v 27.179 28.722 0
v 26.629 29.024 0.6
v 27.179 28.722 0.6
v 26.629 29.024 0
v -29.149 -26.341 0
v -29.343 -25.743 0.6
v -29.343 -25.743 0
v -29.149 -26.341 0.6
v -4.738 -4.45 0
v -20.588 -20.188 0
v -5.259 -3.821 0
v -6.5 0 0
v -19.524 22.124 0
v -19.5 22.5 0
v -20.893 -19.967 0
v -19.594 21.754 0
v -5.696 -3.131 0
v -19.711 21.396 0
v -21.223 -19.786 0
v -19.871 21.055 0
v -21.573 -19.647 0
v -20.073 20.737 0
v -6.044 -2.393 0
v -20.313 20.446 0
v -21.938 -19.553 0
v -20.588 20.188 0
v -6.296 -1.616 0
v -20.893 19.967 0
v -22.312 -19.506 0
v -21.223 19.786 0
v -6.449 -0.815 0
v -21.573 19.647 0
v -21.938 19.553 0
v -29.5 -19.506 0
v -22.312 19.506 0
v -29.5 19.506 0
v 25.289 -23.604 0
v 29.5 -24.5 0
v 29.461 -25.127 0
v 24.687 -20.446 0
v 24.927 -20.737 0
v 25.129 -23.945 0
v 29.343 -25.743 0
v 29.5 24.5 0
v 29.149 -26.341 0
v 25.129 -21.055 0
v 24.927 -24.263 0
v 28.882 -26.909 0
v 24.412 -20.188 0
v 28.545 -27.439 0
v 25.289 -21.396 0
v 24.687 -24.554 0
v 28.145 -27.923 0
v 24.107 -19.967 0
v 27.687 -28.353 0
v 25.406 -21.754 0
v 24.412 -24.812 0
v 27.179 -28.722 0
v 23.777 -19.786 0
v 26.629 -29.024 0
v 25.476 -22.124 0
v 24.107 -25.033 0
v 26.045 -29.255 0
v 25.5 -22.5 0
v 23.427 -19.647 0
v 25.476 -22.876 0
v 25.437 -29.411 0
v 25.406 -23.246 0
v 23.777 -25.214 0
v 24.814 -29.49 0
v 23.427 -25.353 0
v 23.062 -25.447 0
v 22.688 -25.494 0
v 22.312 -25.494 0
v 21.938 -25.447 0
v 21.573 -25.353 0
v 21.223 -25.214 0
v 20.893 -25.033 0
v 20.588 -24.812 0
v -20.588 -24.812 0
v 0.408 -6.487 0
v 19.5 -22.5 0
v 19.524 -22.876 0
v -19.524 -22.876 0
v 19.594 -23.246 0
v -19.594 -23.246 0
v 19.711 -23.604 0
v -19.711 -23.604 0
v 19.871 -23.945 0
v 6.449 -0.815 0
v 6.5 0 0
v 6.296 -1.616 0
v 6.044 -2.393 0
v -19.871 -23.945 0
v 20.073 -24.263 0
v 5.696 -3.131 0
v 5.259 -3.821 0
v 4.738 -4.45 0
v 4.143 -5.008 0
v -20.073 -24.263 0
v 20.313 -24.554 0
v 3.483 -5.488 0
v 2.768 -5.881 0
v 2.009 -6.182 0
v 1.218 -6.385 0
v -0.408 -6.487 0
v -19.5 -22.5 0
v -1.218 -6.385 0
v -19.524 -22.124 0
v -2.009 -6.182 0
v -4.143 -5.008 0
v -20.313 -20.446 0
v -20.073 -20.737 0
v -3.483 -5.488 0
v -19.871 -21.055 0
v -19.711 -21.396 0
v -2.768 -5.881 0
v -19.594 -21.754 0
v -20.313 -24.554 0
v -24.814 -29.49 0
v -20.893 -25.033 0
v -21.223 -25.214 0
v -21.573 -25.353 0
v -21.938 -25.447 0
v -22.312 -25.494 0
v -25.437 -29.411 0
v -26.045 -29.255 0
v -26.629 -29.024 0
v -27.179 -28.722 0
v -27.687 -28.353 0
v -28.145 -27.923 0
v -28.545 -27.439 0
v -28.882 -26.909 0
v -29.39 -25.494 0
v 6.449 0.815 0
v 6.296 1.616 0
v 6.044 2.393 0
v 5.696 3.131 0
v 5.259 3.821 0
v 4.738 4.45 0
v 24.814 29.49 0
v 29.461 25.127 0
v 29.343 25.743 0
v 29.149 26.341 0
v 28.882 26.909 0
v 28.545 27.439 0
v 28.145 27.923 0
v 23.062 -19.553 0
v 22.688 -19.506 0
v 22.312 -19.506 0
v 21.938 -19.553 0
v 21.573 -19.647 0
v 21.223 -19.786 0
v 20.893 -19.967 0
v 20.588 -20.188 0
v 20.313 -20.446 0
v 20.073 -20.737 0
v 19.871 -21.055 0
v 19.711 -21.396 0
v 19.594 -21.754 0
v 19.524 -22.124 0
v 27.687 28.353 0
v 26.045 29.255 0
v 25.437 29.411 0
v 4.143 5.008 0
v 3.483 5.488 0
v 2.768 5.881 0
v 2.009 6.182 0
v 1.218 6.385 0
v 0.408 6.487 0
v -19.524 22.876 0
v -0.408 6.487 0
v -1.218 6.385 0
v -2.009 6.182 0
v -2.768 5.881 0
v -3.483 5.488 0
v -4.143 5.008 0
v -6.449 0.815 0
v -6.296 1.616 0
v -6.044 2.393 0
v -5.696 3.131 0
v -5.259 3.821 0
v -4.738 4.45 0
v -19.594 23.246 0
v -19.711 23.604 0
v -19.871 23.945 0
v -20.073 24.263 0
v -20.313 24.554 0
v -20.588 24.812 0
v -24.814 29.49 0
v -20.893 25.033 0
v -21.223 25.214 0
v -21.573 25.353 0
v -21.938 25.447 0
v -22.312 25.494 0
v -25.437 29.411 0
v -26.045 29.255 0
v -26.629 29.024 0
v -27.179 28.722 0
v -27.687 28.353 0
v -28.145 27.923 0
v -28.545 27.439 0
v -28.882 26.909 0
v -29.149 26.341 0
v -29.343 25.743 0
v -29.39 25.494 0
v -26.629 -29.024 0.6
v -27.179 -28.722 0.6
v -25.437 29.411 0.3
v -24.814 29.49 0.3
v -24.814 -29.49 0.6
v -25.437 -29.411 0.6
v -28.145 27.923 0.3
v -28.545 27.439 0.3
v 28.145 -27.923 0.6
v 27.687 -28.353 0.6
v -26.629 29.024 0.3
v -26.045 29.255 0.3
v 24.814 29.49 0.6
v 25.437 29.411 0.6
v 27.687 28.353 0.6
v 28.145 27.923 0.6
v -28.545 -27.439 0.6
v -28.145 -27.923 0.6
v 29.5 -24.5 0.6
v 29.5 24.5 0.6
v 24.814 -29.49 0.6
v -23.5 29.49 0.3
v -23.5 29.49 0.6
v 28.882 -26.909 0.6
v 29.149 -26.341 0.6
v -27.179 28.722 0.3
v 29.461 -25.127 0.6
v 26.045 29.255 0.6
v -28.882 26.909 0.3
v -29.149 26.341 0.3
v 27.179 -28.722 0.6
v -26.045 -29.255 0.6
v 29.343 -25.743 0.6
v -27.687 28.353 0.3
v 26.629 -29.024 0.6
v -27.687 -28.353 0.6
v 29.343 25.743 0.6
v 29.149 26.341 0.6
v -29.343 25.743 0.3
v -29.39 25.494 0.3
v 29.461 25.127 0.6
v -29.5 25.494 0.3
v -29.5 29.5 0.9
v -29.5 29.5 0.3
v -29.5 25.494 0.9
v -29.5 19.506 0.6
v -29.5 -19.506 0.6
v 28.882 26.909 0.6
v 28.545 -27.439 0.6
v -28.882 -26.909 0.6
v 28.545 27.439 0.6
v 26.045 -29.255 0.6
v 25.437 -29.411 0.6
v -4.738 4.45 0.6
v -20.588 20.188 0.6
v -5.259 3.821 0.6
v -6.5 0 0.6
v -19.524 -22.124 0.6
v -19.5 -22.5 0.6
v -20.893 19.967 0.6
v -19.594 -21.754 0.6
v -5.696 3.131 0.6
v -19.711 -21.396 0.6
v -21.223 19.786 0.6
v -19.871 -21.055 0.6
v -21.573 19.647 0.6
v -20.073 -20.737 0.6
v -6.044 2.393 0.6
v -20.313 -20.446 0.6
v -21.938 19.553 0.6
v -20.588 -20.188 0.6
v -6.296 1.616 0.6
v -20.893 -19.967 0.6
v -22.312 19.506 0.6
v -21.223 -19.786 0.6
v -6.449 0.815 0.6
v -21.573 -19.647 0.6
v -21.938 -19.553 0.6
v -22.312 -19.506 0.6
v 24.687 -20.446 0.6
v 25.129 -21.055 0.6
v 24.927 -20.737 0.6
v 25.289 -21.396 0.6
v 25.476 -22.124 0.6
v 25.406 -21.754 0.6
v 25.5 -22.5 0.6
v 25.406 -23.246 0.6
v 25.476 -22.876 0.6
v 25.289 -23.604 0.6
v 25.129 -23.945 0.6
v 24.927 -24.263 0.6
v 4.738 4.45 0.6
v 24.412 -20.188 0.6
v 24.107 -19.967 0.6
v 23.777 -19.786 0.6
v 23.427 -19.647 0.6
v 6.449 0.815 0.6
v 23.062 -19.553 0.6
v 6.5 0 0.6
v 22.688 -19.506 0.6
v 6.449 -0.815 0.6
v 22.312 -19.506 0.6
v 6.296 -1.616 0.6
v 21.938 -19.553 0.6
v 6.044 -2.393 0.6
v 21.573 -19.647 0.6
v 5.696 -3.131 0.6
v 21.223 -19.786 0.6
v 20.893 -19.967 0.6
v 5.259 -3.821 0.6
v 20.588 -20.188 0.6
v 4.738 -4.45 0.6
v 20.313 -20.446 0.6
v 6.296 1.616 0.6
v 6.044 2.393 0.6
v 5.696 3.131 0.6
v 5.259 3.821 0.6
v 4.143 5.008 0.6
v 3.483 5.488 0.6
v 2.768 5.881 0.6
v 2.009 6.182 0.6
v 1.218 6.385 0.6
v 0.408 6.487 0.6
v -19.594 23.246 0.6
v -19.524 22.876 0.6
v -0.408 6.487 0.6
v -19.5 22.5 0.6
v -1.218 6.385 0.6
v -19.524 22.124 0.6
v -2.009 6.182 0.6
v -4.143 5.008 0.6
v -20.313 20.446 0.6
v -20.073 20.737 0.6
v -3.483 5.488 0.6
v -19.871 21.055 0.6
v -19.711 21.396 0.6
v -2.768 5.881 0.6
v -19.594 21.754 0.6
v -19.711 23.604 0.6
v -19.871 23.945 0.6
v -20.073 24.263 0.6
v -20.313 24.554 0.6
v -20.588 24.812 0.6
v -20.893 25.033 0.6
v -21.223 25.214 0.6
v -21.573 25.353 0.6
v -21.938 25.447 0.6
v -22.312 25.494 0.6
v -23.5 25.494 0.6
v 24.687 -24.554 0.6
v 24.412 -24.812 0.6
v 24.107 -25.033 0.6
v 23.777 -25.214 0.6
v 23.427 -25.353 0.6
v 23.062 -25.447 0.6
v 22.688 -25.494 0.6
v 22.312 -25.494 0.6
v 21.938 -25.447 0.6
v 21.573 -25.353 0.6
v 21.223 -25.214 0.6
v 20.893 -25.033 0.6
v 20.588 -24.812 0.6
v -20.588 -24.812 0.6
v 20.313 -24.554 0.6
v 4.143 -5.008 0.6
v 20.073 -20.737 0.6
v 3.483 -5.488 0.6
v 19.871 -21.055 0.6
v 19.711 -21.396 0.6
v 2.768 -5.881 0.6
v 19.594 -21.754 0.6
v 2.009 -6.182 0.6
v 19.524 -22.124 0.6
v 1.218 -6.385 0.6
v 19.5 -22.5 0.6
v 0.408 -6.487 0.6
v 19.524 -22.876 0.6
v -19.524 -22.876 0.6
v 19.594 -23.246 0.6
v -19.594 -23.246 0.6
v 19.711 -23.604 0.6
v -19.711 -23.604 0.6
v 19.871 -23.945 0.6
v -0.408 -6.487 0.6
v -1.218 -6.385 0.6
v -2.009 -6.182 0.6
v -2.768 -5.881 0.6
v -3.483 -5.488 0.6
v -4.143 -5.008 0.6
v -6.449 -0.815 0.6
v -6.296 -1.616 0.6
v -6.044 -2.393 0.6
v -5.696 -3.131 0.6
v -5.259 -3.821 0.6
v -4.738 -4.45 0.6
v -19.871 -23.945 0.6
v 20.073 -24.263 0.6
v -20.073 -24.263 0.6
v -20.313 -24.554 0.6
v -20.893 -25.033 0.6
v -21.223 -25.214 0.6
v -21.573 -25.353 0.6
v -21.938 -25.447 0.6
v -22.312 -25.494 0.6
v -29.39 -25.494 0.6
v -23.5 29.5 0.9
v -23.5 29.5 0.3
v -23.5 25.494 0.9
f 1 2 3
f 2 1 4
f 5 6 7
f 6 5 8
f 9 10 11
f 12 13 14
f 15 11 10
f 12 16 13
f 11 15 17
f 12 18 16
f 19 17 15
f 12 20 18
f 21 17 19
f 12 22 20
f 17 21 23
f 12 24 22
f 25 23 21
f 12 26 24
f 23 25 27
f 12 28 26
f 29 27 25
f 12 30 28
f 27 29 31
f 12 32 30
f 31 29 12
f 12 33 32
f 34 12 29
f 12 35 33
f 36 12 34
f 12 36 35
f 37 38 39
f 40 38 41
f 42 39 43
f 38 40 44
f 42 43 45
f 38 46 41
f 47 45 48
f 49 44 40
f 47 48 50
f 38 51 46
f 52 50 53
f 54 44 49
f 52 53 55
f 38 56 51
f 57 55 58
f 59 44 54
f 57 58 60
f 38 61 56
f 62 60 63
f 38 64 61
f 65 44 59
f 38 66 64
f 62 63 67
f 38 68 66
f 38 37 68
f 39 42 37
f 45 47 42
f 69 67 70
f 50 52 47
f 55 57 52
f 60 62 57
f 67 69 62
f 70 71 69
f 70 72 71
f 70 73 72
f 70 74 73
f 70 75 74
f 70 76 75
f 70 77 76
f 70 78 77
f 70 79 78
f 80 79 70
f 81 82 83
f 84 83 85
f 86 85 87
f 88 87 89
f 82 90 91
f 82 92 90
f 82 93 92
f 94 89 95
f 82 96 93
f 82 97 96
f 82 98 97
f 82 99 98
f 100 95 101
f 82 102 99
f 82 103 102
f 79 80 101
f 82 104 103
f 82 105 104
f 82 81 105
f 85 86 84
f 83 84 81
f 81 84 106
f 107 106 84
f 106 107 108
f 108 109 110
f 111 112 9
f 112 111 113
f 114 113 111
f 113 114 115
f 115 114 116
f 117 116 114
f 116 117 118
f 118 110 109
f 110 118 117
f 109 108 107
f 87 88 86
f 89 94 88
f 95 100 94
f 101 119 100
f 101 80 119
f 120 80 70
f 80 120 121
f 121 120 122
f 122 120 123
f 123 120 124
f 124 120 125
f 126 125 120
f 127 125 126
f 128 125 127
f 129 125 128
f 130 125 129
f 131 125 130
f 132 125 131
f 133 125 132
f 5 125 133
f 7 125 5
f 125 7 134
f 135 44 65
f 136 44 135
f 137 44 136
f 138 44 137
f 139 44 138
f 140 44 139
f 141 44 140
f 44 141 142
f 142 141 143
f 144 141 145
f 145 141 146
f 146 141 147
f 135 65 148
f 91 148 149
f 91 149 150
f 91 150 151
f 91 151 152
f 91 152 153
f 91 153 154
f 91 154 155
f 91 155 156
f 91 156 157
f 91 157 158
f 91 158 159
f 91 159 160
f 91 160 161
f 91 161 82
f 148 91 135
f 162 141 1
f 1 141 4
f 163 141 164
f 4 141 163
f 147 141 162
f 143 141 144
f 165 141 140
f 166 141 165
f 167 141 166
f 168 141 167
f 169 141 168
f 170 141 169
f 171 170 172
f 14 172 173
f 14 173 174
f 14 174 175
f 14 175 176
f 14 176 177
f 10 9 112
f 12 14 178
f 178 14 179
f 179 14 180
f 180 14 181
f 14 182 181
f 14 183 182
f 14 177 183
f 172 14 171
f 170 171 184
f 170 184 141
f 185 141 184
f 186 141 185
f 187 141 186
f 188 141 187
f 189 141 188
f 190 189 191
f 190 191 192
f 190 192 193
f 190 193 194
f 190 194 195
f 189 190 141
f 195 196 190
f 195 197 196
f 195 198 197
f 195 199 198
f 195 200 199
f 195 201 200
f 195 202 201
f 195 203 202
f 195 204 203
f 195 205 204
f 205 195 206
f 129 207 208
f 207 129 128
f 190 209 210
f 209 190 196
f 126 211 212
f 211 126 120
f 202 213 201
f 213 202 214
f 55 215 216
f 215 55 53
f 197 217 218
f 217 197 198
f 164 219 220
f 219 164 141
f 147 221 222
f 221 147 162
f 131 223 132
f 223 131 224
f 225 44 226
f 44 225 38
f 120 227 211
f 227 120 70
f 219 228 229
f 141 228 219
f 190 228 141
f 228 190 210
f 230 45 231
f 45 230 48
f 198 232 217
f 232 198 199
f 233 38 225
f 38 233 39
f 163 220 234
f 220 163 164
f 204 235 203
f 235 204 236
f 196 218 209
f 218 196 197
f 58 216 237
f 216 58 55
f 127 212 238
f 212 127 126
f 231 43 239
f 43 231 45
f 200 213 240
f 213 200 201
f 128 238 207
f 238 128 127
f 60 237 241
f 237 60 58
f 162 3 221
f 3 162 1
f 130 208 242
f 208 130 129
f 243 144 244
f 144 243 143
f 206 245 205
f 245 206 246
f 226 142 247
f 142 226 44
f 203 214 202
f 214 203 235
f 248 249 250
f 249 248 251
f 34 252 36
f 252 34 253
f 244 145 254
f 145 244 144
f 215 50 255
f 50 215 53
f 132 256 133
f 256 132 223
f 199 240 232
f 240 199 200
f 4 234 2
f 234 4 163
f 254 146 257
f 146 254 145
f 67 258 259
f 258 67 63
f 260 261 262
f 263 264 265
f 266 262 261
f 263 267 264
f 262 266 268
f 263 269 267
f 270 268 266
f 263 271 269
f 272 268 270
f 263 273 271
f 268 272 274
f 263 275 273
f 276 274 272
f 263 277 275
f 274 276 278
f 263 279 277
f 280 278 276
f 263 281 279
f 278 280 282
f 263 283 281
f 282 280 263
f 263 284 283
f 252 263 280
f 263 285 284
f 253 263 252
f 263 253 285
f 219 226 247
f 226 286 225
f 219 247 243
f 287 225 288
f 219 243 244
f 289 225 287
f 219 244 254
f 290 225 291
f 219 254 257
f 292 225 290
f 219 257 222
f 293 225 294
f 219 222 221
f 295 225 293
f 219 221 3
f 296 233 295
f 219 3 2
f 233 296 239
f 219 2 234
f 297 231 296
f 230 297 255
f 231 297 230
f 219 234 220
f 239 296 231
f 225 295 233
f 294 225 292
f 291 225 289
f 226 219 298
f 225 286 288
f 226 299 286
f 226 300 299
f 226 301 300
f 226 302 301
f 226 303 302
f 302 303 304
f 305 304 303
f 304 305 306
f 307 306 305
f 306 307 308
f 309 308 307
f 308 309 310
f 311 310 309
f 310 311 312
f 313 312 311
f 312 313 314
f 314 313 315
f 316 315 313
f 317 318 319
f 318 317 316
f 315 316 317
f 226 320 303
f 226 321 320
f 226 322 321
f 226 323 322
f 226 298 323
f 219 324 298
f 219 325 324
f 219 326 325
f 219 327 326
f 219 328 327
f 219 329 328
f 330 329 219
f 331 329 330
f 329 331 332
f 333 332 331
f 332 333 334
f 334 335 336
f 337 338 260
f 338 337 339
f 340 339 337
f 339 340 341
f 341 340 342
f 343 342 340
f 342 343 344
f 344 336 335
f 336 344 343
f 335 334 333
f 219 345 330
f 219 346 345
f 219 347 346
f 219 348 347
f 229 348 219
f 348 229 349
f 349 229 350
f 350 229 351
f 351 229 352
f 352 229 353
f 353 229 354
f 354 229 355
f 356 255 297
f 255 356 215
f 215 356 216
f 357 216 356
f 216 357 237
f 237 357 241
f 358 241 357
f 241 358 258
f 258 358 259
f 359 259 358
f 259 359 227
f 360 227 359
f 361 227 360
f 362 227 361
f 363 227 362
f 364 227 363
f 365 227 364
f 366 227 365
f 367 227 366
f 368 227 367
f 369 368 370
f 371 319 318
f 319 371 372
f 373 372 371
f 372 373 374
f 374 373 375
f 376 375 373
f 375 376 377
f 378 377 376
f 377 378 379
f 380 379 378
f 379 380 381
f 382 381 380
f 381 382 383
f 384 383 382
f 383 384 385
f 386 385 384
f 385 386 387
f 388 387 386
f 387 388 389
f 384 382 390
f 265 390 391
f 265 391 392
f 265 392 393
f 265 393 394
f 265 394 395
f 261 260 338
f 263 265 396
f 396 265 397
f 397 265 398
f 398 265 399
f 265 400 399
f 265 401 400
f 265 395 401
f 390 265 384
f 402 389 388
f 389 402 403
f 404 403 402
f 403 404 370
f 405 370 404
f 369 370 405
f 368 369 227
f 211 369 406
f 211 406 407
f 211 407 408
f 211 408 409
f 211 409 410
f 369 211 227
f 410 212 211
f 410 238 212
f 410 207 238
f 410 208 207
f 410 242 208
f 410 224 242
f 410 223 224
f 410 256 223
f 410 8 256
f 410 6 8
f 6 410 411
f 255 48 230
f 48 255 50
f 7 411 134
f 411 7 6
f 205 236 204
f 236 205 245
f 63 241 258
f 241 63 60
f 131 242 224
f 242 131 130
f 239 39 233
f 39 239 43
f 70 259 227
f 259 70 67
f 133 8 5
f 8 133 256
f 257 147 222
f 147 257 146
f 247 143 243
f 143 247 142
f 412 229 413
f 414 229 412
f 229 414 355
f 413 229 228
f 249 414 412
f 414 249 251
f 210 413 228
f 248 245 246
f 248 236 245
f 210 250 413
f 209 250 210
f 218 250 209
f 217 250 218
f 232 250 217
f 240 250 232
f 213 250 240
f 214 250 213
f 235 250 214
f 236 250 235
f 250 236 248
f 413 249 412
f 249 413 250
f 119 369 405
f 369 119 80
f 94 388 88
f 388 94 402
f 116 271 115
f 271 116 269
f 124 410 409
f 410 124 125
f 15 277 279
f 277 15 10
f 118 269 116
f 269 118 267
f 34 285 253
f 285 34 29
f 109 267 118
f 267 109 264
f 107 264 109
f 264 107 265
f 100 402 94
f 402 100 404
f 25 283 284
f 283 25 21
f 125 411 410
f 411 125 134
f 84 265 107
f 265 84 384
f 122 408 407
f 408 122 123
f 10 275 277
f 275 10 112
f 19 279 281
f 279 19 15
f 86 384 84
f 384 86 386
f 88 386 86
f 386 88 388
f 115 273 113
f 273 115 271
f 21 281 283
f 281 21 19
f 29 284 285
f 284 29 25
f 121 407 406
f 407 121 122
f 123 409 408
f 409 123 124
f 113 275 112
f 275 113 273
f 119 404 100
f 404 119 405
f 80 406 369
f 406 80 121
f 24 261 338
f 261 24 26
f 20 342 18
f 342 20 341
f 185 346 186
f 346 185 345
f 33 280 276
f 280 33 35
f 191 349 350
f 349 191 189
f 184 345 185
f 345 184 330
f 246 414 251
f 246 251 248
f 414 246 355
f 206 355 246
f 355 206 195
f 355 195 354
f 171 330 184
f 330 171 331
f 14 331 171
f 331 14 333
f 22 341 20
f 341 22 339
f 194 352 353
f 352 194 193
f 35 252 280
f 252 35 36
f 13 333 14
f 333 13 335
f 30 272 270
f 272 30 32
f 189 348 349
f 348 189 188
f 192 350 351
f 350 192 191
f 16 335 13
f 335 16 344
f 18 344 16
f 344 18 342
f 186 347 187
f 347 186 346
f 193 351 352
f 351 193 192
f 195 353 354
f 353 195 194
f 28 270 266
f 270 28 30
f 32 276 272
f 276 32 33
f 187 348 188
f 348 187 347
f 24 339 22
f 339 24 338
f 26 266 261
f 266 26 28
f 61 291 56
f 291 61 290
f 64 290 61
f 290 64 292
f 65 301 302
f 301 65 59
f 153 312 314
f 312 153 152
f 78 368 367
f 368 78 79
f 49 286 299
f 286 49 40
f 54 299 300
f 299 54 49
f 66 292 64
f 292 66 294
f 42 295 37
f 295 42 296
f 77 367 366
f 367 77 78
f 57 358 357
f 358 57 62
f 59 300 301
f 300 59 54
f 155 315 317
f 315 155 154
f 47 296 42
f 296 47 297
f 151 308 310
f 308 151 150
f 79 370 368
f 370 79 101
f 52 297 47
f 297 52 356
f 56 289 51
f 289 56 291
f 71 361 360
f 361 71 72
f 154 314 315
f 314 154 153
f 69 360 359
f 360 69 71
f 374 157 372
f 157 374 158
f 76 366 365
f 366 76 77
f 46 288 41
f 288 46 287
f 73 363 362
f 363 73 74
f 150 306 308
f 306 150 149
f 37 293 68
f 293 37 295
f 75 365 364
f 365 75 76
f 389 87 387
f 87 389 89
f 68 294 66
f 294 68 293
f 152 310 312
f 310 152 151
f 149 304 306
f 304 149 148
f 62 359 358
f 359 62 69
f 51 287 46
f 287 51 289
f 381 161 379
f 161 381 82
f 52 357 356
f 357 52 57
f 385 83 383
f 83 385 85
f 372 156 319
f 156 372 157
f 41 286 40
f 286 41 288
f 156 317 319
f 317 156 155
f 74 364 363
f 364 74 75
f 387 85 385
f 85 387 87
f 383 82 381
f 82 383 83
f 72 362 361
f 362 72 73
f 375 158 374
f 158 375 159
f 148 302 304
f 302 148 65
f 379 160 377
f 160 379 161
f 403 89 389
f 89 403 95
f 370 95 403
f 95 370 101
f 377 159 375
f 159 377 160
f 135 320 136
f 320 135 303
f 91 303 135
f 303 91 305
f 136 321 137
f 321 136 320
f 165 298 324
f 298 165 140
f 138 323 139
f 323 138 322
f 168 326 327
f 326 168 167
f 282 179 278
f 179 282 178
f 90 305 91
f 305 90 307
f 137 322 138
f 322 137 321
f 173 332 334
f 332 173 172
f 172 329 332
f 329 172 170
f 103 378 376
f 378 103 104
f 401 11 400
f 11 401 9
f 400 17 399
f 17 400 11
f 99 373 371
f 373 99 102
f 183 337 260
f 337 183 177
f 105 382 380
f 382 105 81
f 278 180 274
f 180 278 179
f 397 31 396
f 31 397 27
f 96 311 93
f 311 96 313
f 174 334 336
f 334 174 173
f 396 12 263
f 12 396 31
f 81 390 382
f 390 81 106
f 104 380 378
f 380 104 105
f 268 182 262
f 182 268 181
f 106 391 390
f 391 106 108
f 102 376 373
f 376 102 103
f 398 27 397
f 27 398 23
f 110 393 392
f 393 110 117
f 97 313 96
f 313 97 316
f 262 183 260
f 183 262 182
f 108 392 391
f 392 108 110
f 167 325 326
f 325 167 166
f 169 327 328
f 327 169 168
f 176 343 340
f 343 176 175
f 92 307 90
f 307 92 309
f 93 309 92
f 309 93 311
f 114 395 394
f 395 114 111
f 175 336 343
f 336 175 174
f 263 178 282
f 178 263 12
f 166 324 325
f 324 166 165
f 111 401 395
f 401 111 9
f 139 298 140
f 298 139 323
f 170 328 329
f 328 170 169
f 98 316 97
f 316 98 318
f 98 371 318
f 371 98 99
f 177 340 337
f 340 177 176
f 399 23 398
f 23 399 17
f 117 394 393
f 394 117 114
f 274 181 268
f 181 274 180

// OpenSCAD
$fn = 50;


difference() {
	union() {
		translate(v = [0, 0, 0]) {
			rotate(a = [0, 0, 0]) {
				hull() {
					translate(v = [-24.5000000000, 24.5000000000, 0]) {
						rotate(a = [0, 0, 0]) {
							translate(v = [0, 0, 0]) {
								rotate(a = [0, 0, 0]) {
									cylinder(h = 0.6000000000, r = 5);
								}
							}
						}
					}
					translate(v = [24.5000000000, 24.5000000000, 0]) {
						rotate(a = [0, 0, 0]) {
							translate(v = [0, 0, 0]) {
								rotate(a = [0, 0, 0]) {
									cylinder(h = 0.6000000000, r = 5);
								}
							}
						}
					}
					translate(v = [-24.5000000000, -24.5000000000, 0]) {
						rotate(a = [0, 0, 0]) {
							translate(v = [0, 0, 0]) {
								rotate(a = [0, 0, 0]) {
									cylinder(h = 0.6000000000, r = 5);
								}
							}
						}
					}
					translate(v = [24.5000000000, -24.5000000000, 0]) {
						rotate(a = [0, 0, 0]) {
							translate(v = [0, 0, 0]) {
								rotate(a = [0, 0, 0]) {
									cylinder(h = 0.6000000000, r = 5);
								}
							}
						}
					}
				}
			}
		}
		#translate(v = [-29.5000000000, 23.5000000000, 0.3000000000]) {
			rotate(a = [0, 0, 0]) {
				cube(size = [6, 6, 0.6000000000]);
			}
		}
	}
	union() {
		translate(v = [-30.0000000000, -22.5000000000, -125]) {
			rotate(a = [0, 0, 0]) {
				hull() {
					translate(v = [7.5000000000, 0, 0]) {
						rotate(a = [0, 0, 0]) {
							translate(v = [0, 0, 0]) {
								rotate(a = [0, 0, 0]) {
									cylinder(h = 250, r = 3.0000000000);
								}
							}
						}
					}
					translate(v = [-7.5000000000, 0, 0]) {
						rotate(a = [0, 0, 0]) {
							translate(v = [0, 0, 0]) {
								rotate(a = [0, 0, 0]) {
									cylinder(h = 250, r = 3.0000000000);
								}
							}
						}
					}
				}
			}
		}
		translate(v = [-30.0000000000, 22.5000000000, -125]) {
			rotate(a = [0, 0, 0]) {
				hull() {
					translate(v = [7.5000000000, 0, 0]) {
						rotate(a = [0, 0, 0]) {
							translate(v = [0, 0, 0]) {
								rotate(a = [0, 0, 0]) {
									cylinder(h = 250, r = 3.0000000000);
								}
							}
						}
					}
					translate(v = [-7.5000000000, 0, 0]) {
						rotate(a = [0, 0, 0]) {
							translate(v = [0, 0, 0]) {
								rotate(a = [0, 0, 0]) {
									cylinder(h = 250, r = 3.0000000000);
								}
							}
						}
					}
				}
			}
		}
		translate(v = [22.5000000000, -22.5000000000, -125.0000000000]) {
			rotate(a = [0, 0, 0]) {
				cylinder(h = 250, r = 3.0000000000);
			}
		}
		translate(v = [0, 0, 0.0000000000]) {
			rotate(a = [0, 0, 0]) {
				cylinder(h = 0.6000000000, r = 6.5000000000);
			}
		}
	}
}
